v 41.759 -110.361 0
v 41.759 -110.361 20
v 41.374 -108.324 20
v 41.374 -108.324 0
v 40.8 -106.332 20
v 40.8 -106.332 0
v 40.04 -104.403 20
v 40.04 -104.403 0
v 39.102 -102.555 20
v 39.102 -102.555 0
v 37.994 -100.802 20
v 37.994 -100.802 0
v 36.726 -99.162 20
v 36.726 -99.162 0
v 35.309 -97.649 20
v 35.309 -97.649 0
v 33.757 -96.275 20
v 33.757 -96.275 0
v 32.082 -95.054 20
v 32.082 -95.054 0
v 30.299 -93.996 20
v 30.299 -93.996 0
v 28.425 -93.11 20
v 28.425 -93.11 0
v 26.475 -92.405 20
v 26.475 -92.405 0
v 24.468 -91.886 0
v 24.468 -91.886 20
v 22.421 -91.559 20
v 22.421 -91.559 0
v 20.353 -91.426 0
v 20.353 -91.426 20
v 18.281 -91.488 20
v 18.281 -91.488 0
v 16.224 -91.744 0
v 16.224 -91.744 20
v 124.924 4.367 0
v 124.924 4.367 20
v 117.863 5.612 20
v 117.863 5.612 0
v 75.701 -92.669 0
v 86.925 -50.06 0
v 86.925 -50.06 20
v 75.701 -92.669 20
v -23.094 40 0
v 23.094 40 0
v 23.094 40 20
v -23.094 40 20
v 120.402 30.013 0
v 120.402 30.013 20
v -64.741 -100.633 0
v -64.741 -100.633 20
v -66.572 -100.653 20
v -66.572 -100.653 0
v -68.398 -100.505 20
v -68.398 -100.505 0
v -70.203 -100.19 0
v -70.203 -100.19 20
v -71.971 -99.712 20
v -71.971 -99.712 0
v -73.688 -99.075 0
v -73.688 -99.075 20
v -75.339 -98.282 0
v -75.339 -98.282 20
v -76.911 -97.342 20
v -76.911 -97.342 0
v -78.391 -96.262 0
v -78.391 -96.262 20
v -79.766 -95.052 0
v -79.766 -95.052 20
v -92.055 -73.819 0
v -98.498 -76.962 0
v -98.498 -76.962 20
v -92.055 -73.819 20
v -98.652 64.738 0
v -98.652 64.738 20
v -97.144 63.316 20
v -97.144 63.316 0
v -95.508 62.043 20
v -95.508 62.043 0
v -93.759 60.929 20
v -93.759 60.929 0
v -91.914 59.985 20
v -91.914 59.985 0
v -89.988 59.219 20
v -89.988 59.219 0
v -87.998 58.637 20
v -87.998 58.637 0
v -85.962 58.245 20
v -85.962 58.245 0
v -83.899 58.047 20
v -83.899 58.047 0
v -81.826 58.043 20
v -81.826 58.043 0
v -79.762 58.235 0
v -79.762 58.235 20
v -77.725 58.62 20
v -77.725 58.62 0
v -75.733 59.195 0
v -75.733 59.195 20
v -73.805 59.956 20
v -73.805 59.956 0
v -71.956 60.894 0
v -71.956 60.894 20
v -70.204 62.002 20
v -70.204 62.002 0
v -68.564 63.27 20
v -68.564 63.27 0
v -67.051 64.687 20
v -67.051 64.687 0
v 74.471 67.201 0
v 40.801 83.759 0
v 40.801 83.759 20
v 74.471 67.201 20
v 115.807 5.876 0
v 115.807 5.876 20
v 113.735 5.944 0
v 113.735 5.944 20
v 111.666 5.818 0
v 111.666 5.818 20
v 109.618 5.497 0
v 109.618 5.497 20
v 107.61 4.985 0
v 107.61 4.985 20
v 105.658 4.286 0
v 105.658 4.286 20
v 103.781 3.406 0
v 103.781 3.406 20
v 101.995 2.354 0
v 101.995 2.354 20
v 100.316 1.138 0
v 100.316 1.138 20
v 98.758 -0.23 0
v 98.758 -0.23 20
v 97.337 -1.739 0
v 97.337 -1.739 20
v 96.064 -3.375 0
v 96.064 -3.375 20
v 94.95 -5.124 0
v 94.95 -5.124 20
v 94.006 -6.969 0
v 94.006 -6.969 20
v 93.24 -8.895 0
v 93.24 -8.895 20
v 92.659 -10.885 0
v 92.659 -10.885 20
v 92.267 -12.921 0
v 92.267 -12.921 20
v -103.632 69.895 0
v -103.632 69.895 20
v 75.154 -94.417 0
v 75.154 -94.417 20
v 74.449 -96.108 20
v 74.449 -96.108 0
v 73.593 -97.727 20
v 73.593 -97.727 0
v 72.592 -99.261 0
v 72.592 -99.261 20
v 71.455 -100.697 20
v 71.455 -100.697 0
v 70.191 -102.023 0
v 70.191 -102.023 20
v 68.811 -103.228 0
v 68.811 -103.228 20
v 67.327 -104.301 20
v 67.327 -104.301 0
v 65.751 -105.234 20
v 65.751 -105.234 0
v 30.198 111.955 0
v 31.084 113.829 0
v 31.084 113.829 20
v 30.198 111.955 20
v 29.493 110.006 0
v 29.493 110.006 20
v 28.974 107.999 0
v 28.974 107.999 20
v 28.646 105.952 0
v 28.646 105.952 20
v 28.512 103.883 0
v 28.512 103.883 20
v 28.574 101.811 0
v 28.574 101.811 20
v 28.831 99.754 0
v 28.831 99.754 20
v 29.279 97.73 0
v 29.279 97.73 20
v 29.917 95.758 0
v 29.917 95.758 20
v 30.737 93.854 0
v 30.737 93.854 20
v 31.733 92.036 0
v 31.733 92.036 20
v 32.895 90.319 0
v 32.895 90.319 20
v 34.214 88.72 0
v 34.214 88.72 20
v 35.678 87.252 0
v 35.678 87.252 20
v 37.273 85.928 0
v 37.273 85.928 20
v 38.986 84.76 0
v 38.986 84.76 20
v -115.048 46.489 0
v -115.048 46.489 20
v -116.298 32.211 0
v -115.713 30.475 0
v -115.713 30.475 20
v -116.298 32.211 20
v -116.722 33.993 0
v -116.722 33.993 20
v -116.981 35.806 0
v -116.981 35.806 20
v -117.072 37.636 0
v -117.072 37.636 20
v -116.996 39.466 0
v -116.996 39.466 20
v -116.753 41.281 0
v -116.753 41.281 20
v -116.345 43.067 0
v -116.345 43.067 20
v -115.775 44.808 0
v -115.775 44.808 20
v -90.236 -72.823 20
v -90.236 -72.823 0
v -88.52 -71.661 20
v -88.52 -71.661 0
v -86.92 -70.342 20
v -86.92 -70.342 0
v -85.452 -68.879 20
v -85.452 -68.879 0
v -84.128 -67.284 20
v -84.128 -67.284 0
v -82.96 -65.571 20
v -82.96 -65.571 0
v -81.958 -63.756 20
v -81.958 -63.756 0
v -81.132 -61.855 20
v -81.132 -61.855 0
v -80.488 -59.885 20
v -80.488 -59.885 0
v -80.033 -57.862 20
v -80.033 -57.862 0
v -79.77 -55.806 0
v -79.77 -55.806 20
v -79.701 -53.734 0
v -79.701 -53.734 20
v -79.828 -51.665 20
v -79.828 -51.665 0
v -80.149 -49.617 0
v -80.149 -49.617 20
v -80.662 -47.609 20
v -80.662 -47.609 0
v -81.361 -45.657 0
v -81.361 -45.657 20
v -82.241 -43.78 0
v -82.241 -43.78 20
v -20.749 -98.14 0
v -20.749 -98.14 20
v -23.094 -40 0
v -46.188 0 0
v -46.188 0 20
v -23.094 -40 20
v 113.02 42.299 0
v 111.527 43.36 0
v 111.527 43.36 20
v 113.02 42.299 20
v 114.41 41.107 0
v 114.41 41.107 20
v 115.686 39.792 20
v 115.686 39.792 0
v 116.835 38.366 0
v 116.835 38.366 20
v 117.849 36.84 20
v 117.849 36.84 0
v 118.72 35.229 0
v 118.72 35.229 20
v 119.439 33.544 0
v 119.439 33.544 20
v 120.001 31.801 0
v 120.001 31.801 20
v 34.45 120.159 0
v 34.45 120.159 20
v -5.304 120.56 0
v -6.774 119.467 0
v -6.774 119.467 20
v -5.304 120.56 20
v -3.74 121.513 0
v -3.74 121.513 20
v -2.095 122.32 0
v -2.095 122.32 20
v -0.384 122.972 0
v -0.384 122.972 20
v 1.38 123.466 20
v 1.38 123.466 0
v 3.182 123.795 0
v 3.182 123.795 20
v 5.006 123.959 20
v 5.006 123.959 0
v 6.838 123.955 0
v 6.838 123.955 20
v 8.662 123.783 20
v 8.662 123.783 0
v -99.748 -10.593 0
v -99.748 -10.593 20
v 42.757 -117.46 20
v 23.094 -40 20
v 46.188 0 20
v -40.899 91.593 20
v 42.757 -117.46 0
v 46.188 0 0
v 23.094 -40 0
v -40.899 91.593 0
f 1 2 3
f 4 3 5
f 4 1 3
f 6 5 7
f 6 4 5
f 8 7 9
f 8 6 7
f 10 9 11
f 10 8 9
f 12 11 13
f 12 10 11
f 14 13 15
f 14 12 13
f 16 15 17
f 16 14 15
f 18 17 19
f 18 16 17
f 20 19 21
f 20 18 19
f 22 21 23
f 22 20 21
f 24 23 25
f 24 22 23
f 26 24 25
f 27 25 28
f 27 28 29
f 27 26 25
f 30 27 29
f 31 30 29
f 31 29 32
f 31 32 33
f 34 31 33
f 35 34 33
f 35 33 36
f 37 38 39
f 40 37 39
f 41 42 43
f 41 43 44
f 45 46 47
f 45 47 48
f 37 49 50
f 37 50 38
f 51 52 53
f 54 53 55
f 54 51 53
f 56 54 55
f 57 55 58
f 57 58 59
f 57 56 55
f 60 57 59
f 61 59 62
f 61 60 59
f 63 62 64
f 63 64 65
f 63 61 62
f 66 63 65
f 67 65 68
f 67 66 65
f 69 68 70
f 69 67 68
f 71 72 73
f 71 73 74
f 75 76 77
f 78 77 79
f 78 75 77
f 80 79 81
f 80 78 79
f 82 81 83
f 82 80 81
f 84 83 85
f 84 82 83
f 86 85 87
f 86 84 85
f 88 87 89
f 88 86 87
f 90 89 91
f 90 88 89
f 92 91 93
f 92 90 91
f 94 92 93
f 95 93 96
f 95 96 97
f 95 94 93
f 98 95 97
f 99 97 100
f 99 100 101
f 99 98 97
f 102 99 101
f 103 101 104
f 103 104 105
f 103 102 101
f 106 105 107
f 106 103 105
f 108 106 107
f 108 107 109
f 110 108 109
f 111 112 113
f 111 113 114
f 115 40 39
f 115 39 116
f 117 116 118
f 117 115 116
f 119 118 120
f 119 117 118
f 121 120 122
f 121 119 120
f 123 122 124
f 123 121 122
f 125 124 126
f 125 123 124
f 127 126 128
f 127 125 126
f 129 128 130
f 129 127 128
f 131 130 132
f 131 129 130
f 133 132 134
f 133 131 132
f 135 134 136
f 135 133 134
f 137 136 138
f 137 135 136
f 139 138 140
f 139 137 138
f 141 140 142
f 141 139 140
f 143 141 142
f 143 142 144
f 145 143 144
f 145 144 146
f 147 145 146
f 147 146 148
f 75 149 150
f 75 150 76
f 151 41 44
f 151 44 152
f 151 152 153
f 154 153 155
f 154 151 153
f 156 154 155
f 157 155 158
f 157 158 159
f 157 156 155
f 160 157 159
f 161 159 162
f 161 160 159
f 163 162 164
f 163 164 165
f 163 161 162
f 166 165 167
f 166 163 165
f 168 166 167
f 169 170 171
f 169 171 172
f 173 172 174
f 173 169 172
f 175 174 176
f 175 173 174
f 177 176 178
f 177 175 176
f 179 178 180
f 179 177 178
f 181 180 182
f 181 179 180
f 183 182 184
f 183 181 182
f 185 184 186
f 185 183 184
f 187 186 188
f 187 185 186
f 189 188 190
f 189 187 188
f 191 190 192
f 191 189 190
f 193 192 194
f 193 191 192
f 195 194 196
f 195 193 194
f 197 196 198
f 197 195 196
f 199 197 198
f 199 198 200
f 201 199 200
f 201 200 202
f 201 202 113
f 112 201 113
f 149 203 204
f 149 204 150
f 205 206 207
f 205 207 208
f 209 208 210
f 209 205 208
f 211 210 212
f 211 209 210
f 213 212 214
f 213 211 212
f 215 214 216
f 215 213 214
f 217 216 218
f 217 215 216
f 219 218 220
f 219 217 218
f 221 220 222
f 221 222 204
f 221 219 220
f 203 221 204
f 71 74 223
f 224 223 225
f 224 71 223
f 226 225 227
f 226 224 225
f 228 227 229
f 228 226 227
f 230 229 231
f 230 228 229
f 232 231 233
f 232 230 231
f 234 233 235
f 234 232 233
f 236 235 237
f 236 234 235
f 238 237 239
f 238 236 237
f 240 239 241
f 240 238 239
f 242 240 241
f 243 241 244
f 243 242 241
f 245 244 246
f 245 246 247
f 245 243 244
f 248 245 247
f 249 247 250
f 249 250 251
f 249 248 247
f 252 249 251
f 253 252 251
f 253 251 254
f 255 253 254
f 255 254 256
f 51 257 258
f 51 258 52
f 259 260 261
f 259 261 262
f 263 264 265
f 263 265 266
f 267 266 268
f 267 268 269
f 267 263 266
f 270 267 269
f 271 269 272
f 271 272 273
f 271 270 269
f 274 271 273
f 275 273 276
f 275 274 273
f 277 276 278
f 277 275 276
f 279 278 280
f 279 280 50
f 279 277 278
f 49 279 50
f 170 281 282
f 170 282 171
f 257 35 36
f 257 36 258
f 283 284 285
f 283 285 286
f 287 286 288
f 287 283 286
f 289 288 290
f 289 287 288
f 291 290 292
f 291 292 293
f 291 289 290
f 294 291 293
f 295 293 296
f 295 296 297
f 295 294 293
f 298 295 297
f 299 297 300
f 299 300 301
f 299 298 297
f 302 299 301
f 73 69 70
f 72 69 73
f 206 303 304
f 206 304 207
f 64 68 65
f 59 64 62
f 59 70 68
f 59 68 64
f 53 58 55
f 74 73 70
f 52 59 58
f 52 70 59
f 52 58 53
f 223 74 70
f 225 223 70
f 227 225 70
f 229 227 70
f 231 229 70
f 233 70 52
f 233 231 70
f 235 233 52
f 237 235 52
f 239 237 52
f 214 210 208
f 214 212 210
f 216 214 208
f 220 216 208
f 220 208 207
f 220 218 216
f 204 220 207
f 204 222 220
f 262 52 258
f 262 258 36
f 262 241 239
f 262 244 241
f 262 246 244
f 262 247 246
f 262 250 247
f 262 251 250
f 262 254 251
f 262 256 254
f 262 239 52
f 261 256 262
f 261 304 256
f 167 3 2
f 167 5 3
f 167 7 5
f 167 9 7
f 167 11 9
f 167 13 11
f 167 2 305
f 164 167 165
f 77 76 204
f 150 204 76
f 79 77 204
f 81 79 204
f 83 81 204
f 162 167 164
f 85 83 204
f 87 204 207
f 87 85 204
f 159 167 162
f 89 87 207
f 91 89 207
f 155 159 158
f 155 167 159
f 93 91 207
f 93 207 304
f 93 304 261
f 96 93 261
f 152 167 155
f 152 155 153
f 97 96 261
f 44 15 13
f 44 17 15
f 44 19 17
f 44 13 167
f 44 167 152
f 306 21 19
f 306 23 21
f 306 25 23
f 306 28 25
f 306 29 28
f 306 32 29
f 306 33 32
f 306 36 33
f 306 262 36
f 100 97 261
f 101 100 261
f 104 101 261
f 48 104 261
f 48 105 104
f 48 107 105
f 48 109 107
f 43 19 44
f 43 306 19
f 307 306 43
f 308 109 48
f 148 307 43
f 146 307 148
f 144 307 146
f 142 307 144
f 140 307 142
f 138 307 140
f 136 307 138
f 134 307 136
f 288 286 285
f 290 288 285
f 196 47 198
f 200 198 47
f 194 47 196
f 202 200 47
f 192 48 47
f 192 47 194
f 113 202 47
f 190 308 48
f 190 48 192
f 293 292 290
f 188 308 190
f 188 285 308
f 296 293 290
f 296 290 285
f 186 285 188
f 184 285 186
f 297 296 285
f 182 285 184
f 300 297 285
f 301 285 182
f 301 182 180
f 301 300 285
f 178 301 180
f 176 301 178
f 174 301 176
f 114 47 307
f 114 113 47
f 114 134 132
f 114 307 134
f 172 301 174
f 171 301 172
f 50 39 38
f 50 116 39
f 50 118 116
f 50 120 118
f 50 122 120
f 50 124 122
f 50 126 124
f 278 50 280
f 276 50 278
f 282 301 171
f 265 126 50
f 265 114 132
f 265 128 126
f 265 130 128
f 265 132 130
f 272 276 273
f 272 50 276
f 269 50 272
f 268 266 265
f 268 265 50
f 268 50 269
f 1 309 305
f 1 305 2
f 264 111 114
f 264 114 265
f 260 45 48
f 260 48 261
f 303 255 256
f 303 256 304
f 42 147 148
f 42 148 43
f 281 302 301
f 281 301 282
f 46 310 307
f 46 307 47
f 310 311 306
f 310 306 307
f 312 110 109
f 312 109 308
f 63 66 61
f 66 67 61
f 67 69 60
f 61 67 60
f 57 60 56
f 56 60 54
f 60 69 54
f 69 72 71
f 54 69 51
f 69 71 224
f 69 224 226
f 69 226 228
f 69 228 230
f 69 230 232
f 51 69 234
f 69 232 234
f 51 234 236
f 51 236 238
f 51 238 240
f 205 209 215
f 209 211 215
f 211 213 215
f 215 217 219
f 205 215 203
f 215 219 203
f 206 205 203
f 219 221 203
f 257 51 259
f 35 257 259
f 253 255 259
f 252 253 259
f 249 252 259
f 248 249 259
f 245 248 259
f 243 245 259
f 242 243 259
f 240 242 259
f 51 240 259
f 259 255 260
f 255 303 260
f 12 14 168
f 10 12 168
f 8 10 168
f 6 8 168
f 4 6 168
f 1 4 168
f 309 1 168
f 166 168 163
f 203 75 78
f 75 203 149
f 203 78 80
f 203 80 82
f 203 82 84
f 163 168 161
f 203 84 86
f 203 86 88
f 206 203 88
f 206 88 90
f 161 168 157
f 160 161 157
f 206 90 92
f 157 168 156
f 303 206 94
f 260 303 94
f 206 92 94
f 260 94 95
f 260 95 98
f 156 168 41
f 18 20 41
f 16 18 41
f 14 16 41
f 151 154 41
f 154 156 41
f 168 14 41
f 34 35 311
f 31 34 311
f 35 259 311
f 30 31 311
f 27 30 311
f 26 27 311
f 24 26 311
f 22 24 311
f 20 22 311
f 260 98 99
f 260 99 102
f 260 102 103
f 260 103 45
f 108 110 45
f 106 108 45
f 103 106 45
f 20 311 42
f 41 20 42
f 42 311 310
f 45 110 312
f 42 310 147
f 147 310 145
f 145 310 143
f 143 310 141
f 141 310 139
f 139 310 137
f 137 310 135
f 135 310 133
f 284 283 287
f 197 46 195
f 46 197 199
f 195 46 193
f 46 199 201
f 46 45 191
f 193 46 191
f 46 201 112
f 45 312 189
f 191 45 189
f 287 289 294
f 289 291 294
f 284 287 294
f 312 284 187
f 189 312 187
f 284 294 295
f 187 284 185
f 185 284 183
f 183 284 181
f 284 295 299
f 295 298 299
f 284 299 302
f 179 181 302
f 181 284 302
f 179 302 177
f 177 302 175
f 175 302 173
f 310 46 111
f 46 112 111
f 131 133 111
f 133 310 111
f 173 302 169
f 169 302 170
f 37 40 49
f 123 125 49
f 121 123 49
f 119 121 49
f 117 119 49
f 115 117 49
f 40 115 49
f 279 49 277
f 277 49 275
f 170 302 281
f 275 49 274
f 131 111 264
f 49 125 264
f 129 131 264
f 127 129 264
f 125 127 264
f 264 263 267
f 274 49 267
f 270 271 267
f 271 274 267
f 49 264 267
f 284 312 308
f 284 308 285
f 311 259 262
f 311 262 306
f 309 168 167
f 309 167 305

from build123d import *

# Parameters (mm, degrees)
SKETCH1_R           = 125
BOSS_EXTRUDE1_DEPTH = 20
CUT_EXTRUDE1_START  = -30
CUT_EXTRUDE1_DEPTH  = 30


with BuildPart() as part:
    # Sketch1 → Boss-Extrude1 (new body)
    with BuildSketch(Plane.XY):
        Circle(SKETCH1_R)
        Polygon((23.094010768, -40), (46.188021535, 0), (23.094010768, 40), (-23.094010768, 40), (-46.188021535, 0), (-23.094010768, -40), align=None, mode=Mode.SUBTRACT)
    extrude(amount=BOSS_EXTRUDE1_DEPTH)

    # Sketch3 → Cut-Extrude1 (cut)
    with BuildSketch(Plane.XY.offset(20).offset(CUT_EXTRUDE1_START)):
        with BuildLine():
            ThreePointArc((-6.774110793, 119.467271802), (0.492536101, 123.239201876), (8.661716474, 123.783357737))
            Line((8.661716474, 123.783357737), (34.45, 120.159050845))
            ThreePointArc((34.45, 120.159050845), (-42.75708256, 117.459916103), (-103.632412842, 69.895085725))
            Line((-103.632412842, 69.895085725), (-98.652289989, 64.738017545))
            ThreePointArc((-98.652289989, 64.738017545), (-82.862560201, 58.020530735), (-67.051084533, 64.686671523))
            Line((-67.051084533, 64.686671523), (-40.898801445, 91.592627068))
            Line((-40.898801445, 91.592627068), (-6.774110793, 119.467271802))
        make_face()
        with BuildLine():
            ThreePointArc((124.923683754, 4.367291753), (98.498353472, 76.96151222), (34.45, 120.159050845))
            Line((34.45, 120.159050845), (31.084279298, 113.829050845))
            ThreePointArc((31.084279298, 113.829050845), (29.574864535, 96.736307856), (40.800755858, 83.75865168))
            Line((40.800755858, 83.75865168), (74.471340122, 67.200749946))
            Line((74.471340122, 67.200749946), (111.526811975, 43.35997947))
            ThreePointArc((111.526811975, 43.35997947), (117.359648033, 37.614578084), (120.401586576, 30.013379267))
            Line((120.401586576, 30.013379267), (124.923683754, 4.367291753))
        make_face()
        with BuildLine():
            ThreePointArc((42.75708256, -117.459916103), (103.632412842, -69.895085725), (124.923683754, 4.367291753))
            Line((124.923683754, 4.367291753), (117.863431111, 5.612204784))
            ThreePointArc((117.863431111, 5.612204784), (101.140831696, 1.765795466), (92.26733842, -12.920977933))
            Line((92.26733842, -12.920977933), (86.924620828, -50.060279532))
            Line((86.924620828, -50.060279532), (75.70147125, -92.669330738))
            ThreePointArc((75.70147125, -92.669330738), (72.039715291, -99.992114147), (65.75055633, -105.234069233))
            Line((65.75055633, -105.234069233), (42.75708256, -117.459916103))
        make_face()
        with BuildLine():
            Line((-115.048351394, 46.488943056), (-103.632412842, 69.895085725))
            ThreePointArc((-103.632412842, 69.895085725), (-124.923683754, -4.367291753), (-98.498353472, -76.96151222))
            Line((-98.498353472, -76.96151222), (-92.054747579, -73.818755638))
            ThreePointArc((-92.054747579, -73.818755638), (-80.786743134, -60.877647816), (-82.240605082, -43.780090059))
            Line((-82.240605082, -43.780090059), (-99.748189513, -10.593393299))
            Line((-99.748189513, -10.593393299), (-115.713442688, 30.474855047))
            ThreePointArc((-115.713442688, 30.474855047), (-117.055243981, 38.551437421), (-115.048351394, 46.488943056))
        make_face()
        with BuildLine():
            Line((-79.765507985, -95.051610828), (-98.498353472, -76.96151222))
            ThreePointArc((-98.498353472, -76.96151222), (-34.45, -120.159050845), (42.75708256, -117.459916103))
            Line((42.75708256, -117.459916103), (41.75932716, -110.360517537))
            ThreePointArc((41.75932716, -110.360517537), (32.933607104, -95.644986241), (16.223595337, -91.744255211))
            Line((16.223595337, -91.744255211), (-20.748969991, -98.139704183))
            Line((-20.748969991, -98.139704183), (-64.740729744, -100.632775581))
            ThreePointArc((-64.740729744, -100.632775581), (-72.836655443, -99.413103234), (-79.765507985, -95.051610828))
        make_face()
    extrude(amount=CUT_EXTRUDE1_DEPTH, mode=Mode.SUBTRACT)


solid = part.part
